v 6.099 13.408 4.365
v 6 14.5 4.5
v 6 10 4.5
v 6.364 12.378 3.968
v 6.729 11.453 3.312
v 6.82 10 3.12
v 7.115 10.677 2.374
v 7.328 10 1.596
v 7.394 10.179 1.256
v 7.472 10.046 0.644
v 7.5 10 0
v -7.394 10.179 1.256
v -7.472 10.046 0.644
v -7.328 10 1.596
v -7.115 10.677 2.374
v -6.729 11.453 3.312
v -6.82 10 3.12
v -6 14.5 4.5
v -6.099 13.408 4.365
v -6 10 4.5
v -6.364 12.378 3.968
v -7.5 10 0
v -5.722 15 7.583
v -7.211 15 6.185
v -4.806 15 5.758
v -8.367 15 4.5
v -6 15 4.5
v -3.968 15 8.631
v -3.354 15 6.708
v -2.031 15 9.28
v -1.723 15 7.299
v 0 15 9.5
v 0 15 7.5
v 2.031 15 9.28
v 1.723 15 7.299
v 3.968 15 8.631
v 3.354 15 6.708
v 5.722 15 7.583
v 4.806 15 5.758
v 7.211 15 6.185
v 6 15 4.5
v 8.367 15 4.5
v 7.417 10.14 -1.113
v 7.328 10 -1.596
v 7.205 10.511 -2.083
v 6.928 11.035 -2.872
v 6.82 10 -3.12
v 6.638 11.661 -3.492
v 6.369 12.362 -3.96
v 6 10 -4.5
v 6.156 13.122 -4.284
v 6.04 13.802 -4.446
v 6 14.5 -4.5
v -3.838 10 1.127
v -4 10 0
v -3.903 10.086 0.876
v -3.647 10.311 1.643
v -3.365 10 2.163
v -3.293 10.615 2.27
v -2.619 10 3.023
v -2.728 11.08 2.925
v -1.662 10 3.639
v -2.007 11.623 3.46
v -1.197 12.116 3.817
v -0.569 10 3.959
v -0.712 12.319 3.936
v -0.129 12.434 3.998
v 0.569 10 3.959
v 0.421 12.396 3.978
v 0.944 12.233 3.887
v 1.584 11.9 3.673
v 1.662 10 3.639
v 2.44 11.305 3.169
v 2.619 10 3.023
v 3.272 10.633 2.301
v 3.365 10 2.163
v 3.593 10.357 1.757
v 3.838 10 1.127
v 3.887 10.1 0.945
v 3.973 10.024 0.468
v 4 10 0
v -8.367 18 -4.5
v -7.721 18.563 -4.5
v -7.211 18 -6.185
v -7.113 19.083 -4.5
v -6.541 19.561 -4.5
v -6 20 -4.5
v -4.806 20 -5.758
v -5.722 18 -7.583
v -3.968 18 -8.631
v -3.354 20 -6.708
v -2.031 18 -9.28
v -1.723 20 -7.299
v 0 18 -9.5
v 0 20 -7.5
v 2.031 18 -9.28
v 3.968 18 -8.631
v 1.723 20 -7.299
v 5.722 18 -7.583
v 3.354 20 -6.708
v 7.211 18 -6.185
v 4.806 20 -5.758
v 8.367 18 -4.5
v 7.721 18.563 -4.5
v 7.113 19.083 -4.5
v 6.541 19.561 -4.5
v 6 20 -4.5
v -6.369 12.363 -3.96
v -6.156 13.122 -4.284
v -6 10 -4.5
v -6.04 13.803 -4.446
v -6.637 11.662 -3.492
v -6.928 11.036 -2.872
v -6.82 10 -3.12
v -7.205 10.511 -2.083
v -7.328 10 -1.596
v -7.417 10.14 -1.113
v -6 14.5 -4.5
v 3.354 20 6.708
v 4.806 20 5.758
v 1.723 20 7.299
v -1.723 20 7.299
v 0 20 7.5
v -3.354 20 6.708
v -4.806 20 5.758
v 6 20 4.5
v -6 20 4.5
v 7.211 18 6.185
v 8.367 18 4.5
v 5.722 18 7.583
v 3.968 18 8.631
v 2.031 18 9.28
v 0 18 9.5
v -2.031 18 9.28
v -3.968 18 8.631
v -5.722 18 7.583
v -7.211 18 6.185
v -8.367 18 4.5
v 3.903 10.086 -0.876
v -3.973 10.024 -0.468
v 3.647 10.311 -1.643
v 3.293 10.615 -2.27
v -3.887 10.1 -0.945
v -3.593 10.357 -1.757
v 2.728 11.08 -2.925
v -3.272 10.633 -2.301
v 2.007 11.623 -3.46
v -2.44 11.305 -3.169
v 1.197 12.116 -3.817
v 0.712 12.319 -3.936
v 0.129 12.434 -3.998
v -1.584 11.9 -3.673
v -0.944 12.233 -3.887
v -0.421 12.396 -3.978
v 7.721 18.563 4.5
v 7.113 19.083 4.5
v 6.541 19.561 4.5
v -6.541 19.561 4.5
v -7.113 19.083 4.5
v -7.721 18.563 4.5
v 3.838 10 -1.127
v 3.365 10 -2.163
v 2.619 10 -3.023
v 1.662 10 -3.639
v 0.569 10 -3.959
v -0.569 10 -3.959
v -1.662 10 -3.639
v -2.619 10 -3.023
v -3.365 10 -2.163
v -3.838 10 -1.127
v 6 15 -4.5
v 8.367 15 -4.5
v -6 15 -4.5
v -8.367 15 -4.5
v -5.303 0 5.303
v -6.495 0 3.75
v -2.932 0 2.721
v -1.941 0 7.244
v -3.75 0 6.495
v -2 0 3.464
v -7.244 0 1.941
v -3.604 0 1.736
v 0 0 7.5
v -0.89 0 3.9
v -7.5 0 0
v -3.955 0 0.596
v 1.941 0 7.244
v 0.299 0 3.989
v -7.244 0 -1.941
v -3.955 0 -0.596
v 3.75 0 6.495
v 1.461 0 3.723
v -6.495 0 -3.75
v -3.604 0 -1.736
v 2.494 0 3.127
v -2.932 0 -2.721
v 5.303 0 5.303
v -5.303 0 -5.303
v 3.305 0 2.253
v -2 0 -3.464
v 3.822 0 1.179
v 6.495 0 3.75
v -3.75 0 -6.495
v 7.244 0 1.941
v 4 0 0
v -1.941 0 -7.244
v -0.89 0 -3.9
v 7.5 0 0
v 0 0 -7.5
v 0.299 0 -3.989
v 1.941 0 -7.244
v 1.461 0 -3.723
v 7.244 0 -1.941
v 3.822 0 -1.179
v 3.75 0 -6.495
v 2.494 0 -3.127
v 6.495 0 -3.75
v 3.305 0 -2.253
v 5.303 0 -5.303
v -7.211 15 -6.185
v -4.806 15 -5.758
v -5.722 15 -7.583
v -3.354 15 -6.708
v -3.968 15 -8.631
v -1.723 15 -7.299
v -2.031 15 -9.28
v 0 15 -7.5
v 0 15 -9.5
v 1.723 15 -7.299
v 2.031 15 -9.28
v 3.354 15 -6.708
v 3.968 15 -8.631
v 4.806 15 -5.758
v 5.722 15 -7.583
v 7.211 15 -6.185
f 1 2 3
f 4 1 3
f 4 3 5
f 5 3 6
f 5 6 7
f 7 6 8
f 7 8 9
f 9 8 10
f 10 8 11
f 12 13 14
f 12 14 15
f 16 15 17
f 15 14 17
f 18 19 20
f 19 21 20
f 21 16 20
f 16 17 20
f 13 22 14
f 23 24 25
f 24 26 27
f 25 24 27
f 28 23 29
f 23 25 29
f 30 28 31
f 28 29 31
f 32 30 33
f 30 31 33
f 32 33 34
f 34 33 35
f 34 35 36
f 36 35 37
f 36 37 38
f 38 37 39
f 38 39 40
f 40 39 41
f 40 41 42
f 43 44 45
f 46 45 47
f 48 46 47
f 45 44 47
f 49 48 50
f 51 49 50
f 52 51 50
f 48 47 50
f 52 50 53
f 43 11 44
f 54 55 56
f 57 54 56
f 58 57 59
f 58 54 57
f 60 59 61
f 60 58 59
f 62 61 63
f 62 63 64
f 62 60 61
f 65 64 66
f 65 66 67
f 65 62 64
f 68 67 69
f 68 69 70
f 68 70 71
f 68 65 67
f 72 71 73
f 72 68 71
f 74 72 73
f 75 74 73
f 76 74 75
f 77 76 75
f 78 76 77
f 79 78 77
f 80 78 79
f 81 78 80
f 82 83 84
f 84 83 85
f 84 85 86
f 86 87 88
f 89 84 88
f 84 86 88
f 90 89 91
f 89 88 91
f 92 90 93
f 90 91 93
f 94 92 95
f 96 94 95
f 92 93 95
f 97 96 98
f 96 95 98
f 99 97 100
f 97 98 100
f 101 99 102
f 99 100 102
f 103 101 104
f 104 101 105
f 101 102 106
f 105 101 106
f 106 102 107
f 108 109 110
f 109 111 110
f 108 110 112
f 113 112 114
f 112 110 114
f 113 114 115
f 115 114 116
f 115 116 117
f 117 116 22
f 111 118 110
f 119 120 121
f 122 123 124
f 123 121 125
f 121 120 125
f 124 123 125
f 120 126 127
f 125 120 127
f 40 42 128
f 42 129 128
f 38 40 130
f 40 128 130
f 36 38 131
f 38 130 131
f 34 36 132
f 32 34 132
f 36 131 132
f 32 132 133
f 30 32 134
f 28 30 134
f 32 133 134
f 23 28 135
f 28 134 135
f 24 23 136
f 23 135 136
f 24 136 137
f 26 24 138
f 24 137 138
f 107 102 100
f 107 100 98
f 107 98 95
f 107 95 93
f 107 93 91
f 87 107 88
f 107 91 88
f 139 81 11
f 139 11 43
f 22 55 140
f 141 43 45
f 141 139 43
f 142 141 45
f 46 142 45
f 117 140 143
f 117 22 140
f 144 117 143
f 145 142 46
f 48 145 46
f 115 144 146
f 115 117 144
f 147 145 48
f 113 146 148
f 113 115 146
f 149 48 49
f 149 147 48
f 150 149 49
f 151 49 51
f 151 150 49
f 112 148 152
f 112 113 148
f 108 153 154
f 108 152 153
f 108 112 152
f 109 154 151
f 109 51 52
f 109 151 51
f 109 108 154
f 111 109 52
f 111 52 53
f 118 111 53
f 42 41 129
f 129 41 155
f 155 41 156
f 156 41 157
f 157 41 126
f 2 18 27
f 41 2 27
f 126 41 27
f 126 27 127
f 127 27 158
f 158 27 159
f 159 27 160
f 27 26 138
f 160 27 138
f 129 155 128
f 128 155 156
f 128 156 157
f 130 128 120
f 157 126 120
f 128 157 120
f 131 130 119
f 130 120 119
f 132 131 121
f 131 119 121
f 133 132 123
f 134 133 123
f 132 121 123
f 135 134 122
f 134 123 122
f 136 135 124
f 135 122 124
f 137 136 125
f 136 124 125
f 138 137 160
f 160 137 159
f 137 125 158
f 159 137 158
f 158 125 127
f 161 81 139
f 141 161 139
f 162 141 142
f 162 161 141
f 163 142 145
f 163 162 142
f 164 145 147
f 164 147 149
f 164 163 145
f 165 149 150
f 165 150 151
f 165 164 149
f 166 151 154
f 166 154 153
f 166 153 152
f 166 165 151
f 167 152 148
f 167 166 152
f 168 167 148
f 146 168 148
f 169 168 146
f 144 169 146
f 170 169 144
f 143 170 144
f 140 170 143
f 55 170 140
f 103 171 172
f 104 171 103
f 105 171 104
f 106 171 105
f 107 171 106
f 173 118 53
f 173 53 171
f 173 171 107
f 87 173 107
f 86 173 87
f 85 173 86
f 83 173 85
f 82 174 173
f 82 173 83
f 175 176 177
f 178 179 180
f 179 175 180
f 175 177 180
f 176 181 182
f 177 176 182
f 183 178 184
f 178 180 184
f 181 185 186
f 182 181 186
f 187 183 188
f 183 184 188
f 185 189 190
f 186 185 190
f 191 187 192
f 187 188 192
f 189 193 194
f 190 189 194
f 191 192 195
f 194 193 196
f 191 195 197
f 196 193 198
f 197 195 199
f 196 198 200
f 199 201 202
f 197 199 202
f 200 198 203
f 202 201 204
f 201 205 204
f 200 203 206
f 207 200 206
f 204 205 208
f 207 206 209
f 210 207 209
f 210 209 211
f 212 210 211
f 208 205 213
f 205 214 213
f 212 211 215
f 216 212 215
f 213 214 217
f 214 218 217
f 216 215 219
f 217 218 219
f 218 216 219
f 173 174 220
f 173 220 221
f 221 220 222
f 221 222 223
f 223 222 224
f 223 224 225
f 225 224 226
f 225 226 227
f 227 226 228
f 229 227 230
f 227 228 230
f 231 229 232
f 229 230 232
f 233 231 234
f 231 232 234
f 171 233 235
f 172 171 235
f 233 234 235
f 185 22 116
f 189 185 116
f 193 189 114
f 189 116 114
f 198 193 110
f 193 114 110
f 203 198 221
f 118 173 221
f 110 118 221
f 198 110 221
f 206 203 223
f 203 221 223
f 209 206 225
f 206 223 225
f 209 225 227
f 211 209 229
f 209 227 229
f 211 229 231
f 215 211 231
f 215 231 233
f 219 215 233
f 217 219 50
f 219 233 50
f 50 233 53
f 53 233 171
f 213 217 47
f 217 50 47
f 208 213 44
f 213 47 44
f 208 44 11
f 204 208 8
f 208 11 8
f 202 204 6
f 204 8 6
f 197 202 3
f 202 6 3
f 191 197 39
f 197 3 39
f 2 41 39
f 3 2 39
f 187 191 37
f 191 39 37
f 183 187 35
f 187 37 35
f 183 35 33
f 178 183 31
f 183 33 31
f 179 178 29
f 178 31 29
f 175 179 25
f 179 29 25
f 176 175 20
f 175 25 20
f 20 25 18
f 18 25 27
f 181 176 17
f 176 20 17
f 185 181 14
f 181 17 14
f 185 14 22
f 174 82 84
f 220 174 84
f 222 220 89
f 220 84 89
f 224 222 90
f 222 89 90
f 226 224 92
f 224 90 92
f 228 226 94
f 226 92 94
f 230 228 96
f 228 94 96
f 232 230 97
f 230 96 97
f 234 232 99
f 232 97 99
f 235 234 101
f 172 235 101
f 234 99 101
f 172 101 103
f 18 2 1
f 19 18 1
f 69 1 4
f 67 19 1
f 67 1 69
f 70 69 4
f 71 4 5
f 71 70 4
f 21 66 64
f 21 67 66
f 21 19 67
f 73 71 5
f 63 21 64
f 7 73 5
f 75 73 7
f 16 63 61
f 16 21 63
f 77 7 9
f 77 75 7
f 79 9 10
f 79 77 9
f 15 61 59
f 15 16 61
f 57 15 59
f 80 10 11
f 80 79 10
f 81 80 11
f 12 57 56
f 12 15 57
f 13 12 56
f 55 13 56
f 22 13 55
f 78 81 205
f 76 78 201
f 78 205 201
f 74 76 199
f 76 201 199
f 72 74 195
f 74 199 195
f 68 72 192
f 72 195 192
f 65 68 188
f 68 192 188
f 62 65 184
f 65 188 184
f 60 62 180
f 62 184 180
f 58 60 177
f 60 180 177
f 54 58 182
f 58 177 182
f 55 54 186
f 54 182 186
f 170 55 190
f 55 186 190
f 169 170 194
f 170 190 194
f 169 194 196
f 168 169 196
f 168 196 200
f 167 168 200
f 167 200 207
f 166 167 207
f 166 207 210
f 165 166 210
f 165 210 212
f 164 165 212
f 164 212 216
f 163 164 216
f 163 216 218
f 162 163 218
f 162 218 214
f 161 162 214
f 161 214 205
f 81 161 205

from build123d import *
from build123d.topology import SkipClean

# Parameters (mm, degrees)
SKETCH2_R               = 4
CUT_EXTRUDE1_DEPTH      = 25.093567606
CUT_EXTRUDE2_DEPTH      = 25.093567606
CUT_EXTRUDE2_DEPTH_BACK = 25.093567606
SKETCH3_W               = 9
SKETCH3_H               = 10
FILLET1_START           = 10
FILLET1_OUTLINE_R       = 4
FILLET1_DEPTH           = 4.5000001
FILLET1_START_2         = -7.500000249
FILLET1_2_DEPTH         = 15.000000249


with BuildPart() as part:
    # Sketch1 → Revolve1 (revolve)
    with BuildSketch(Plane.XY, mode=Mode.PRIVATE) as revolve1_sk:
        Polygon((0, 0), (7.5, 0), (7.5, 15), (9.5, 15), (9.5, 18), (7.5, 20), (0, 20), align=None)
    revolve(revolve1_sk.sketch.rotate(Axis((0, 20, 0), (0, -1, 0)), 180), axis=Axis((0, 20, 0), (0, -1, 0)))

    # Sketch2 → Cut-Extrude1 (cut, through all)
    with BuildSketch(Plane.XZ):
        Circle(SKETCH2_R)
    extrude(amount=-CUT_EXTRUDE1_DEPTH, mode=Mode.SUBTRACT)

    # Sketch3 → Cut-Extrude2 (cut, two sides: drawn at the far end of the back side and taken through both)
    with BuildSketch(Plane(origin=(0, 0, 0), x_dir=(0, 0, -1), z_dir=(1, 0, 0)).offset(-CUT_EXTRUDE2_DEPTH_BACK)):
        with Locations((0, 15)):
            Rectangle(SKETCH3_W, SKETCH3_H)
    extrude(amount=CUT_EXTRUDE2_DEPTH + CUT_EXTRUDE2_DEPTH_BACK, mode=Mode.SUBTRACT)

    # Fillet1: read off the stored shape, not the designer's step
    # Fillet1 outline → Fillet1 (add)
    with SkipClean():  # the faces are left unmerged after this step: merging them gives an invalid solid
        with BuildSketch(Plane(origin=(0, 0, 0), x_dir=(1, 0, 0), z_dir=(0, 1, 0)).offset(FILLET1_START)):
            with BuildLine():
                ThreePointArc((6, -4.5), (7.5, 0), (6, 4.5))
                Line((6, 4.5), (-6, 4.5))
                ThreePointArc((-6, 4.5), (-7.5, 0), (-6, -4.5))
                Line((-6, -4.5), (6, -4.5))
            make_face()
            Circle(FILLET1_OUTLINE_R, mode=Mode.SUBTRACT)
        extrude(amount=FILLET1_DEPTH)

    # Fillet1 2 outline → Fillet1 2 (cut)
    with SkipClean():  # the faces are left unmerged after this step: merging them gives an invalid solid
        with BuildSketch(Plane.YZ.offset(FILLET1_START_2)):
            with BuildLine():
                ThreePointArc((10, 0), (11.318019485, -3.181980515), (14.5, -4.5))
                Line((14.5, -4.5), (14.5, 4.5))
                ThreePointArc((14.5, 4.5), (11.318019485, 3.181980515), (10, 0))
            make_face()
        extrude(amount=FILLET1_2_DEPTH, mode=Mode.SUBTRACT)


solid = part.part
